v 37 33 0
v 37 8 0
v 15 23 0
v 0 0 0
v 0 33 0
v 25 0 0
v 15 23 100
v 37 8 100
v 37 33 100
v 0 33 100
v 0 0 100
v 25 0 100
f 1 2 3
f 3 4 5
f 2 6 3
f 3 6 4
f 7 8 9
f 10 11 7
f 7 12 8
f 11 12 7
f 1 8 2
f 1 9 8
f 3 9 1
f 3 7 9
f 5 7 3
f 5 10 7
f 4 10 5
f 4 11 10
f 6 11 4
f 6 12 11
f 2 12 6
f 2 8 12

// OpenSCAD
h1 = 23;
h2 = 10;
h3 = 8;
d1 = 25;
d2 = 12;
d3 = 15;
// Points
p0 = [0, 0];
p1 = [0, h1 + h2];
p2 = [d3, h1];
p3 = [d1 + d2, h1 + h2];
p4 = [d1 + d2, h3];
p5 = [d1, 0];
points = [p0, p1, p2, p3, p4, p5];
// Polygon
linear_extrude(height=100)
    polygon(points);
